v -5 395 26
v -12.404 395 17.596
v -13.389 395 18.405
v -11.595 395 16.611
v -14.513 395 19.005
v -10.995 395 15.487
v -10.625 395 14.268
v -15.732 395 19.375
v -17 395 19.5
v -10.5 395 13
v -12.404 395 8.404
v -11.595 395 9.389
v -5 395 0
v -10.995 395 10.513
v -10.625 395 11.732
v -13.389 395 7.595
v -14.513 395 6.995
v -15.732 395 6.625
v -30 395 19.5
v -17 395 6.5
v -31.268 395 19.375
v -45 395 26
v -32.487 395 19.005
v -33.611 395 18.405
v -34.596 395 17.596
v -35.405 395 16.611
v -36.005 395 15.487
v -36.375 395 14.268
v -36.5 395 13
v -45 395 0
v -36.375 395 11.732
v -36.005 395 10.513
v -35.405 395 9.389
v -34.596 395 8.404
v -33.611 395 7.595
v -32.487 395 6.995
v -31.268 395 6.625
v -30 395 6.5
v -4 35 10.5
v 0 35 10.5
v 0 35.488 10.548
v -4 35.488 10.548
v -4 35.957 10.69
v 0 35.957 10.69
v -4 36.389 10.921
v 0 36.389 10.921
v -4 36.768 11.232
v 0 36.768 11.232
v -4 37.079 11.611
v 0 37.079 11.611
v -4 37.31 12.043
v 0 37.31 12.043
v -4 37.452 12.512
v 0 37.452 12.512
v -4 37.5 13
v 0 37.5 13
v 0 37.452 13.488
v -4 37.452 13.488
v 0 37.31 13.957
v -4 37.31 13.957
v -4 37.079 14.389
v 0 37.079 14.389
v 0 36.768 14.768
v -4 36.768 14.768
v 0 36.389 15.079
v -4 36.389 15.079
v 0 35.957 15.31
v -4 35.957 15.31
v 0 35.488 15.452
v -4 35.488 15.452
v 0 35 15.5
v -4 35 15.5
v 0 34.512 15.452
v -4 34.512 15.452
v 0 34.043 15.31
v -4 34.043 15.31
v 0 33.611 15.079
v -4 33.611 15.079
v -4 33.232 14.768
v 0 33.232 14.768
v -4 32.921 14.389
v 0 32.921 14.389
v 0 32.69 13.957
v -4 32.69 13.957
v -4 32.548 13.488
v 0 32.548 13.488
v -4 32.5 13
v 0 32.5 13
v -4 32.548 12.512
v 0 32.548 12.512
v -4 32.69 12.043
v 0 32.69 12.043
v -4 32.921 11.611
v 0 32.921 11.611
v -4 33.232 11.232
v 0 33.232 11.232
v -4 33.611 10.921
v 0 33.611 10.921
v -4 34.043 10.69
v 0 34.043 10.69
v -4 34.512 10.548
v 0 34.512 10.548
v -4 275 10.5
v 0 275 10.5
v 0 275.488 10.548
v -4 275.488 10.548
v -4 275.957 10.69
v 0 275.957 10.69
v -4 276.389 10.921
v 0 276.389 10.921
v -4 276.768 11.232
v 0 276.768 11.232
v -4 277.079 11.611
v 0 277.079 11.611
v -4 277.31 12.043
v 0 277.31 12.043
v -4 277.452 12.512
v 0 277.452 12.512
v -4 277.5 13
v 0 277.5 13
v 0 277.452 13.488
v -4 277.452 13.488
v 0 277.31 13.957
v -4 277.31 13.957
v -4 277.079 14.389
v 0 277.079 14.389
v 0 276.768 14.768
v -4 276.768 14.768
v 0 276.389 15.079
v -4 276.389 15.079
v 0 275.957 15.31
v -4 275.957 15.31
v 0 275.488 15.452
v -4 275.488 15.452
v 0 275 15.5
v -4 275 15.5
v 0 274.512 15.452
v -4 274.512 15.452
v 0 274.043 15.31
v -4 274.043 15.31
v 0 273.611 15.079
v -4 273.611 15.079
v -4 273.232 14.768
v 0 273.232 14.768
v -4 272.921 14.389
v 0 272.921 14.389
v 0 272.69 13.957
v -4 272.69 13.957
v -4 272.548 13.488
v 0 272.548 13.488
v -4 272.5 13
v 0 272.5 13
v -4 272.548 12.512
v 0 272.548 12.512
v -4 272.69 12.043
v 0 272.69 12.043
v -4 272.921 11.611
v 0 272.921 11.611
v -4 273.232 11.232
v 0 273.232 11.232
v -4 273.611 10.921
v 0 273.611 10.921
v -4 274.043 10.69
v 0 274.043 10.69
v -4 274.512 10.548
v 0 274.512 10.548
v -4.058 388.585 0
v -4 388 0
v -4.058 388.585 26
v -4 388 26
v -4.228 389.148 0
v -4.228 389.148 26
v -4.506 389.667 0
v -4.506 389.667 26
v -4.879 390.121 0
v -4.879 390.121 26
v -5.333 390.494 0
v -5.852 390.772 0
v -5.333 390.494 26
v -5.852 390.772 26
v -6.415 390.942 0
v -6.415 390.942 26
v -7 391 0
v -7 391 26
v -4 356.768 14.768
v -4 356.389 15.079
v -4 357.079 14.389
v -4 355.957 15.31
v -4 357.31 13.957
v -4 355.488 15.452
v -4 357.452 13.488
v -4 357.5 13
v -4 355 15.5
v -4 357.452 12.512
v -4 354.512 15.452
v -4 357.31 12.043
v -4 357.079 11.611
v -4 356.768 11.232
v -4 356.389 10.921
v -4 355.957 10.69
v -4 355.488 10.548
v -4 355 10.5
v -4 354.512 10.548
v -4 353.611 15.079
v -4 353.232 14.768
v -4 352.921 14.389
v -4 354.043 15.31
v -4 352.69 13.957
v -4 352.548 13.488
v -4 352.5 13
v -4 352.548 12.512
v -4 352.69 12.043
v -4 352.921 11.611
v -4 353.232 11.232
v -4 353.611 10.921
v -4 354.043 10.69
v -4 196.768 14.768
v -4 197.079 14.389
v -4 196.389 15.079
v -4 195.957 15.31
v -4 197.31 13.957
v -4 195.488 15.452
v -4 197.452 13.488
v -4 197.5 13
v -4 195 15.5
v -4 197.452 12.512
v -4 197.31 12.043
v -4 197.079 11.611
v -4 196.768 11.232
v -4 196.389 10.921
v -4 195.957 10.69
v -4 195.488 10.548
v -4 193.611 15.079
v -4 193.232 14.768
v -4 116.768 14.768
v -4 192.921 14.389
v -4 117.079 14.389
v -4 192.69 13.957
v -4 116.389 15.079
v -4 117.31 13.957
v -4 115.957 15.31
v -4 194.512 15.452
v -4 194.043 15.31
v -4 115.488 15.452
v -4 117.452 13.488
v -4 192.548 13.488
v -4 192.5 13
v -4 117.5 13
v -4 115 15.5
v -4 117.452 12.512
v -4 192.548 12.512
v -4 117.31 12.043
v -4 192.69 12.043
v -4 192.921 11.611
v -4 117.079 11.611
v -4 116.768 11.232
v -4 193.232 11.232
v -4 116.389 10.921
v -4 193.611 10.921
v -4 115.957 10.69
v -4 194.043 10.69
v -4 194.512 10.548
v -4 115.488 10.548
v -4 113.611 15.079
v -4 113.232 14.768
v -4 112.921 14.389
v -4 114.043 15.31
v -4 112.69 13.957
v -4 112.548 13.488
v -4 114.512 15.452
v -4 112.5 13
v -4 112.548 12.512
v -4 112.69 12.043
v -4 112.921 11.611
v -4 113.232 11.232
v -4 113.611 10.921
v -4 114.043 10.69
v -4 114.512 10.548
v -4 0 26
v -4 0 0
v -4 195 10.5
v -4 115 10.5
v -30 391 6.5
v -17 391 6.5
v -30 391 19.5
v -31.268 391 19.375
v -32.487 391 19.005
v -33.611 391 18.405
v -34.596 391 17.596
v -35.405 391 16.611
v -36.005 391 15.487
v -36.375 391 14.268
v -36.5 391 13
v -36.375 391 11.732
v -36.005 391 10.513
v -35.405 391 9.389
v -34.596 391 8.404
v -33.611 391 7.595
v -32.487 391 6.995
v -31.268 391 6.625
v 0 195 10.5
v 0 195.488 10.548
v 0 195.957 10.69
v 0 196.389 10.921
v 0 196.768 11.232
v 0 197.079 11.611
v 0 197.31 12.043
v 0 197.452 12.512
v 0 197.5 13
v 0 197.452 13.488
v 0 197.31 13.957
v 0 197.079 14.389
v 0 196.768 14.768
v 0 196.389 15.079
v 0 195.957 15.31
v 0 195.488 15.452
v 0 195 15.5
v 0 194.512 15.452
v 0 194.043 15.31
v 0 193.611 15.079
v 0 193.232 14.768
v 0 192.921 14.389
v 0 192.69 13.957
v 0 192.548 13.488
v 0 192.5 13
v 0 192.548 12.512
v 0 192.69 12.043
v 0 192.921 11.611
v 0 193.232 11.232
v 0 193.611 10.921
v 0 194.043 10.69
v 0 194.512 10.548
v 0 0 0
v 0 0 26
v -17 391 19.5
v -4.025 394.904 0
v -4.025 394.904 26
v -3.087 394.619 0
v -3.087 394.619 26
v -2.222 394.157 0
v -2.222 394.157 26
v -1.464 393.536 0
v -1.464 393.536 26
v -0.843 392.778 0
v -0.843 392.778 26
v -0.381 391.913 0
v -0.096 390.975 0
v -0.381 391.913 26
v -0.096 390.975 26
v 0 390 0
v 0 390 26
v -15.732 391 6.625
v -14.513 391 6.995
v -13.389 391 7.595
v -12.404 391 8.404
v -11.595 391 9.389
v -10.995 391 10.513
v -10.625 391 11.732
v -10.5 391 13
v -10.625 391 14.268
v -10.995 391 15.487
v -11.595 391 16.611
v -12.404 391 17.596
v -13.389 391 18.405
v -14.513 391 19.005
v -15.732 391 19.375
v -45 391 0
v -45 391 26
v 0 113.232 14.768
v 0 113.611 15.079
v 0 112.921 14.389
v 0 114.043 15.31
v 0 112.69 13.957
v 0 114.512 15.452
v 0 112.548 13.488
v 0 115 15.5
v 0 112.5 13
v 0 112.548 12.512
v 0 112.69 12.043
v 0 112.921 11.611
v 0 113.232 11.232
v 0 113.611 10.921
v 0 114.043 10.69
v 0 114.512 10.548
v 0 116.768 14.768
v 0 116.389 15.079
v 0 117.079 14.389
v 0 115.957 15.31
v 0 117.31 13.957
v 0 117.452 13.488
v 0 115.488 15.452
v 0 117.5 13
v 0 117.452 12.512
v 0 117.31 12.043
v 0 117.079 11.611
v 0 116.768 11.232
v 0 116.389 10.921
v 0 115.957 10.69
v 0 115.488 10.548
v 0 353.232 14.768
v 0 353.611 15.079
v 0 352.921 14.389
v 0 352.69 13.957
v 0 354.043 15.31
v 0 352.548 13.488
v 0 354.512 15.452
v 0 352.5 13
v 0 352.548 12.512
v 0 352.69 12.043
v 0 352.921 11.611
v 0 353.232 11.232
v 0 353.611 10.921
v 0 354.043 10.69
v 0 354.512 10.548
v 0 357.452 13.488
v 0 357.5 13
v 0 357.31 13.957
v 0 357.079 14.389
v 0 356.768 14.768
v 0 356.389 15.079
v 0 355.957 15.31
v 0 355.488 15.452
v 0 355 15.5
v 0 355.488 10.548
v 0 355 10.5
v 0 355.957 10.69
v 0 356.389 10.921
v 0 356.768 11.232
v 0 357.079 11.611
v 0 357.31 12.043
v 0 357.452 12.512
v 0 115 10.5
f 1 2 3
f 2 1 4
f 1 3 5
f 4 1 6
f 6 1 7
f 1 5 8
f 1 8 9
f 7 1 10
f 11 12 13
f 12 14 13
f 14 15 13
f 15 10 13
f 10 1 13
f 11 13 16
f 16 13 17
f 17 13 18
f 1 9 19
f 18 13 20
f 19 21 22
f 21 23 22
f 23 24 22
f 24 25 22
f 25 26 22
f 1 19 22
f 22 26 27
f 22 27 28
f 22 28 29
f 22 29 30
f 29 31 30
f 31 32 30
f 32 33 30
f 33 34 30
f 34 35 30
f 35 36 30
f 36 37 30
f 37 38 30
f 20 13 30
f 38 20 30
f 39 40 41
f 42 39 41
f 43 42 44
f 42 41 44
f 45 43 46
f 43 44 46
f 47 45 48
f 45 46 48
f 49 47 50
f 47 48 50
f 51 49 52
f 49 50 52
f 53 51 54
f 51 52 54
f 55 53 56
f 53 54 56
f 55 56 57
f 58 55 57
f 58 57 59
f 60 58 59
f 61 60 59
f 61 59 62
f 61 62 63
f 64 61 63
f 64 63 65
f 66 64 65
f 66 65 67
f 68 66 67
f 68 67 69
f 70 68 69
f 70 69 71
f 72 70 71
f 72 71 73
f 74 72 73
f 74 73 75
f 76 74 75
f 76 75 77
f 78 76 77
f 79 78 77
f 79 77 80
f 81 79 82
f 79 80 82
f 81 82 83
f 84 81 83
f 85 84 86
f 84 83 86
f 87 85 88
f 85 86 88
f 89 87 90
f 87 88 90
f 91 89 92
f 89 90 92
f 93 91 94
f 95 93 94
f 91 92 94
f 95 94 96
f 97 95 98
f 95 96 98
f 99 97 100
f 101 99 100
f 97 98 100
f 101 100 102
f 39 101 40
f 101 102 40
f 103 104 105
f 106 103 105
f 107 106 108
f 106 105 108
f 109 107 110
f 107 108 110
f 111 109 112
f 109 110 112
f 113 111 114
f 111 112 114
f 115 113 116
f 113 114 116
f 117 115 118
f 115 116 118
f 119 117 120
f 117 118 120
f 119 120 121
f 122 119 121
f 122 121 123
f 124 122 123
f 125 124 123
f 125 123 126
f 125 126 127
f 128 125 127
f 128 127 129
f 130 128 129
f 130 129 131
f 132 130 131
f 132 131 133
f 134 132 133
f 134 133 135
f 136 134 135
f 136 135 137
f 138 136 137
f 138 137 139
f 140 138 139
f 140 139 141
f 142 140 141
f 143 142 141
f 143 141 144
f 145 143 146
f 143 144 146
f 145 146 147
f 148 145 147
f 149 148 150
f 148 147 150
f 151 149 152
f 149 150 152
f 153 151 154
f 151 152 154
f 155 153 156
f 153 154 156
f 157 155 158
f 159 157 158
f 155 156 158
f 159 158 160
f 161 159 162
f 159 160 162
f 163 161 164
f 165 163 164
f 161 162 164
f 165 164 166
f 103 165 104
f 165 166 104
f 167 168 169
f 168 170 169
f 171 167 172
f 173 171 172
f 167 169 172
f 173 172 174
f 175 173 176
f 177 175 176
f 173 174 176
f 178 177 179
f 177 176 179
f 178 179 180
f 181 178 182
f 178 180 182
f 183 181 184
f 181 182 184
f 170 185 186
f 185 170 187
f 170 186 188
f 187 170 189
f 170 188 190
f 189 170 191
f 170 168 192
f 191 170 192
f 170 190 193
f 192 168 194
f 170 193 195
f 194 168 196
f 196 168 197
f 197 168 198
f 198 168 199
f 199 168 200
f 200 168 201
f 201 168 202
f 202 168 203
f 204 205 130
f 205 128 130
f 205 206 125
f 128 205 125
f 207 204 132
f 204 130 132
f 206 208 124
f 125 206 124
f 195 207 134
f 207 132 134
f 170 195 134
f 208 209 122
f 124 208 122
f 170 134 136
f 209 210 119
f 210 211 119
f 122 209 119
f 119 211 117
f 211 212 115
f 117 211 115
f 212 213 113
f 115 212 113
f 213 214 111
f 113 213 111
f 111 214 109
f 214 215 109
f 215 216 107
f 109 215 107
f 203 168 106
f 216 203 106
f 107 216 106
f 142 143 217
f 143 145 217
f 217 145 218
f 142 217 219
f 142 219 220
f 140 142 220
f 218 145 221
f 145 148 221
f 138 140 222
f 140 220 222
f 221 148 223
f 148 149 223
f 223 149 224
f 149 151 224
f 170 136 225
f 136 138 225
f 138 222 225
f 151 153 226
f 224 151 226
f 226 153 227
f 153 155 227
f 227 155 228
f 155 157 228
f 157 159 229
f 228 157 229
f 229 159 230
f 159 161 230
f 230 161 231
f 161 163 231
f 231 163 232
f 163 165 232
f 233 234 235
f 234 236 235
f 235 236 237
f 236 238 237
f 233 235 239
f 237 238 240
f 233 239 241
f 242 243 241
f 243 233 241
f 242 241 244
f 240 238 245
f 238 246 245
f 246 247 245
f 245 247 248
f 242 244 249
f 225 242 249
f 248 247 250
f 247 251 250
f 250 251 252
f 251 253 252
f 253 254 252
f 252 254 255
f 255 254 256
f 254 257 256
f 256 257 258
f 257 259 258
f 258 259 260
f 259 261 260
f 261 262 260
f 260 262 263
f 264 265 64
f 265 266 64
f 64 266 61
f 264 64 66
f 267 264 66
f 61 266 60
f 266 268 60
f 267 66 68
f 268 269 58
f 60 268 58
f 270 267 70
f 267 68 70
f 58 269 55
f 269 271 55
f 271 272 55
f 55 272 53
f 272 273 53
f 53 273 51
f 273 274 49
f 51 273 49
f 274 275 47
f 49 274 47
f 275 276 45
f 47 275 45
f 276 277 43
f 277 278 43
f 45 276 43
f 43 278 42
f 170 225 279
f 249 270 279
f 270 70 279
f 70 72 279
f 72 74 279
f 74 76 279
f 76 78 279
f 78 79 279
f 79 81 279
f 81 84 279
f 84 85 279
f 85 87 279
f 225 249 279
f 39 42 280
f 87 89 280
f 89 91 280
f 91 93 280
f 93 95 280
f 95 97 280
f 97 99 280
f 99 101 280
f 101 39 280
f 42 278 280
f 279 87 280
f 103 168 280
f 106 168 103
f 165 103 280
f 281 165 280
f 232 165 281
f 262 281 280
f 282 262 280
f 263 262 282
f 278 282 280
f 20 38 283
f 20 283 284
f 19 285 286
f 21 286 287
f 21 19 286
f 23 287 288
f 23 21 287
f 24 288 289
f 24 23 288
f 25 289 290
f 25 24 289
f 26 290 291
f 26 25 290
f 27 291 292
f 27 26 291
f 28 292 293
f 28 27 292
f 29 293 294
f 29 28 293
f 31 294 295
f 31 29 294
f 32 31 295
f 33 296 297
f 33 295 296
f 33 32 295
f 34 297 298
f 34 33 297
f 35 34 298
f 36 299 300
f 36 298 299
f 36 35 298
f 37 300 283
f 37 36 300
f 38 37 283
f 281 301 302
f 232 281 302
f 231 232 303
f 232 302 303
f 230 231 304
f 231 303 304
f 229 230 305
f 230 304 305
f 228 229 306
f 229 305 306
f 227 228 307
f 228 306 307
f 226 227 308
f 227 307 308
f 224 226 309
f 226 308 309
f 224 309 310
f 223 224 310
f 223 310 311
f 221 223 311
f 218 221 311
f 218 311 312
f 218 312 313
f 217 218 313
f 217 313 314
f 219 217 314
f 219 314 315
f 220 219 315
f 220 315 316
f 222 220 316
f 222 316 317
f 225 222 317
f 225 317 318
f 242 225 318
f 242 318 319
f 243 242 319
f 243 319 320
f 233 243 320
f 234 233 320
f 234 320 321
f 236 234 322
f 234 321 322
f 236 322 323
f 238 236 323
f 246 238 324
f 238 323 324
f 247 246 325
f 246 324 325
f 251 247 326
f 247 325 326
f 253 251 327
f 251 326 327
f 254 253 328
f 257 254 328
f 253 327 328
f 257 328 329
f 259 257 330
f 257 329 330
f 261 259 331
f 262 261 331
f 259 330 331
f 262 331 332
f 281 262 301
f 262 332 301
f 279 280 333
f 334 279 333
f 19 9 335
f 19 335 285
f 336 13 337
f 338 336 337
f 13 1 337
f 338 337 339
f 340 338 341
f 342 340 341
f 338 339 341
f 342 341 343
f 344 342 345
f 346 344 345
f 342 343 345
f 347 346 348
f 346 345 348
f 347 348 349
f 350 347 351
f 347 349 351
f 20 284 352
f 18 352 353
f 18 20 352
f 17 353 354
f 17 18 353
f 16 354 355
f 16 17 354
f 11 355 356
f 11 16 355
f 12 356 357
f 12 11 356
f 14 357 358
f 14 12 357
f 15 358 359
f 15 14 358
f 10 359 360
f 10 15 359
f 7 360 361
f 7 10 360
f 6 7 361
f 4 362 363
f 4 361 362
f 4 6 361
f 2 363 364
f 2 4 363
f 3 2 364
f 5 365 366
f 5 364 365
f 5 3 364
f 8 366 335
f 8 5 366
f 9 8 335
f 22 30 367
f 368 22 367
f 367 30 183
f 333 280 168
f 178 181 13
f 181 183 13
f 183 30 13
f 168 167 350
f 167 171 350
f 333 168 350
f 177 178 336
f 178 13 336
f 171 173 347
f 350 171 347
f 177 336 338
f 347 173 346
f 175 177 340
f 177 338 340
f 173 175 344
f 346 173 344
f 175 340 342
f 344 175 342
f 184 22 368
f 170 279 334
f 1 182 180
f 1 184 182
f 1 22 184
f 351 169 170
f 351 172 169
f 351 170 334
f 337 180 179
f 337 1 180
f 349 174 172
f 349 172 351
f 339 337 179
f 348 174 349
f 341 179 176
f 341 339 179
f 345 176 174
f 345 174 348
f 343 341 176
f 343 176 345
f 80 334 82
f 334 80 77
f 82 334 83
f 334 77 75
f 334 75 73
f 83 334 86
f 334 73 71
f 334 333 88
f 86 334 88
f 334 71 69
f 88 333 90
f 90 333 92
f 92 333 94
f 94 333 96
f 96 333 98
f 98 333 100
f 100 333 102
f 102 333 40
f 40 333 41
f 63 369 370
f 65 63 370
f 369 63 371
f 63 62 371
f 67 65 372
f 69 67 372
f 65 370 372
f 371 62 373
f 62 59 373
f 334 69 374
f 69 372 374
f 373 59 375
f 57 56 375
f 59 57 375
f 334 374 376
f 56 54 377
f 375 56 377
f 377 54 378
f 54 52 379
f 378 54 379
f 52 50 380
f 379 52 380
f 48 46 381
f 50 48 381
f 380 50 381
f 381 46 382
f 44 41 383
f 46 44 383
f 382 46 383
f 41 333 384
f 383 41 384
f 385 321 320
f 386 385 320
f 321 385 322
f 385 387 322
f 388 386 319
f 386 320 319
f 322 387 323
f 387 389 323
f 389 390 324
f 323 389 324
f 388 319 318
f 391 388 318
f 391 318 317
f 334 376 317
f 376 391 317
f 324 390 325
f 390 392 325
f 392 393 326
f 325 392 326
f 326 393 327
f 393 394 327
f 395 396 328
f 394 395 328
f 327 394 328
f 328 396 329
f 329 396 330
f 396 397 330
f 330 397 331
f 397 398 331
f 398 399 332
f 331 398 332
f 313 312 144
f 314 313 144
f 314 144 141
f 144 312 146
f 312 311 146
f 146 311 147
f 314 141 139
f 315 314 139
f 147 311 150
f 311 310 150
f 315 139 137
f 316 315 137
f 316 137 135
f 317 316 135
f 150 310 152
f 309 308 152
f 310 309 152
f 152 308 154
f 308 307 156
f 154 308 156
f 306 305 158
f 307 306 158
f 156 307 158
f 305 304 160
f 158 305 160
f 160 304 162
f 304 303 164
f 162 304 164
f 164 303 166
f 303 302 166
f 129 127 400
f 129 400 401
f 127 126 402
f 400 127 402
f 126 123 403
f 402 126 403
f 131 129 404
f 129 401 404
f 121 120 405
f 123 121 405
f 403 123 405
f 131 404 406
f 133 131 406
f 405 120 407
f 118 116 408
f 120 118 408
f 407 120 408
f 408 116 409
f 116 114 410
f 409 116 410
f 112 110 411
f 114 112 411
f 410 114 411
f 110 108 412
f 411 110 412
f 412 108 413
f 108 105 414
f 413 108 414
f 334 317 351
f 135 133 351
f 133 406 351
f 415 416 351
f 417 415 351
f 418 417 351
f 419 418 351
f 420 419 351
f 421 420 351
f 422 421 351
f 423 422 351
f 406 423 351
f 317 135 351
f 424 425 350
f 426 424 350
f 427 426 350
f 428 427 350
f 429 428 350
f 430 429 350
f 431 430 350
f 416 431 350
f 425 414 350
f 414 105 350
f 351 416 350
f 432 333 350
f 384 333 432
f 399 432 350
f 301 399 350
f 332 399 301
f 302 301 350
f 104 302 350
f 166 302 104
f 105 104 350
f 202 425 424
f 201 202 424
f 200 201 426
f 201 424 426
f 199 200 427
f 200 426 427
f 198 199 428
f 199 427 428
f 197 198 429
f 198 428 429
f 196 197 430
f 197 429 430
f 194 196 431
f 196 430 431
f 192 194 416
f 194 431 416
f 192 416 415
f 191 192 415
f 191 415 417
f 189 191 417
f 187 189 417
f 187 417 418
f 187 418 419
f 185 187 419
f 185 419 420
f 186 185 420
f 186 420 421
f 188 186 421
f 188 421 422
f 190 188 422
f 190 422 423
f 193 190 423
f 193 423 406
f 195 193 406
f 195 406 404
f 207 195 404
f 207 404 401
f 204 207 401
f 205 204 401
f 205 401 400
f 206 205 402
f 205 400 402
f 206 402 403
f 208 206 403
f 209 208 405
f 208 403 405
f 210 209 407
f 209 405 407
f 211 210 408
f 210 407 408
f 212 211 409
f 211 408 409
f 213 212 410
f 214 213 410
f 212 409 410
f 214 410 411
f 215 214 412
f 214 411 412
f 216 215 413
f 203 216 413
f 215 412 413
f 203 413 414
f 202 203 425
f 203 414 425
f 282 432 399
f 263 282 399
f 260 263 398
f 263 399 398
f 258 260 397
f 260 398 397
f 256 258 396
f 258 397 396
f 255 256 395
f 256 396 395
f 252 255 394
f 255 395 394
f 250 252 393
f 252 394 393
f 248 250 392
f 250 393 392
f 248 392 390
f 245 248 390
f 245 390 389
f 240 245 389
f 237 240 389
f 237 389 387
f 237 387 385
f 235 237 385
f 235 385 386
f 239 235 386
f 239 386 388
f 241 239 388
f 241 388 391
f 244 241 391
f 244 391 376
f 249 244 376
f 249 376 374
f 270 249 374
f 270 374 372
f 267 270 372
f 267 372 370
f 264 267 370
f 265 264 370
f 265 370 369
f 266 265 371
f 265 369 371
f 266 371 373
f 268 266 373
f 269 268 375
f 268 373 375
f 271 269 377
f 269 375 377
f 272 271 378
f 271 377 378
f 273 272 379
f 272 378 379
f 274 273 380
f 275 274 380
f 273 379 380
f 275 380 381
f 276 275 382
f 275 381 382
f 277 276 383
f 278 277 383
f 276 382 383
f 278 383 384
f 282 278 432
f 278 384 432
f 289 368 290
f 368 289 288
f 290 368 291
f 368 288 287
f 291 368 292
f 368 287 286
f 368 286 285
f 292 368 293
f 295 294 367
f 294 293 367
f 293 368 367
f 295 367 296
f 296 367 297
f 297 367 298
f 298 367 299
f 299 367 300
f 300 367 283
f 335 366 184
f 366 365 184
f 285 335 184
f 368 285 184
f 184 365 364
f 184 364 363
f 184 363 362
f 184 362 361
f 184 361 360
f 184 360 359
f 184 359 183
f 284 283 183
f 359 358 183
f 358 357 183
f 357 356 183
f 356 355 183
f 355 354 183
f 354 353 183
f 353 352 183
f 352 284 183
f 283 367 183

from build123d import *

# Parameters (mm, degrees)
BOSS_EXTRUDE1_DEPTH = 26
SKETCH2_R           = 2.5
CUT_EXTRUDE1_DEPTH  = 46
CUT_EXTRUDE2_DEPTH  = 396
FILLET1_R           = 3
FILLET2_R           = 5


with BuildPart() as part:
    # Sketch1 → Boss-Extrude1 (new body)
    with BuildSketch(Plane.XY):
        Polygon((0, 0), (0, 395), (-45, 395), (-45, 391), (-4, 391), (-4, 0), align=None)
    extrude(amount=BOSS_EXTRUDE1_DEPTH)

    # Sketch2 → Cut-Extrude1 (cut, through all)
    with BuildSketch(Plane(origin=(0, 0, 0), x_dir=(0, 0, -1), z_dir=(1, 0, 0))):
        with Locations((-13, 195)):
            Circle(SKETCH2_R)
        with Locations((-13, 115)):
            Circle(SKETCH2_R)
        with Locations((-13, 35)):
            Circle(SKETCH2_R)
        with Locations((-13, 275)):
            Circle(SKETCH2_R)
        with Locations((-13, 355)):
            Circle(SKETCH2_R)
    extrude(amount=-CUT_EXTRUDE1_DEPTH, mode=Mode.SUBTRACT)

    # Sketch3 → Cut-Extrude2 (cut, through all)
    with BuildSketch(Plane(origin=(0, 395, 0), x_dir=(1, 0, 0), z_dir=(0, 1, 0))):
        with BuildLine():
            Line((-30, -6.5), (-17, -6.5))
            ThreePointArc((-17, -6.5), (-10.5, -13), (-17, -19.5))
            Line((-17, -19.5), (-30, -19.5))
            ThreePointArc((-30, -19.5), (-36.5, -13), (-30, -6.5))
        make_face()
    extrude(amount=-CUT_EXTRUDE2_DEPTH, mode=Mode.SUBTRACT)

    # Fillet1
    fillet1_edges = [part.edges().sort_by_distance(p)[0] for p in [
        (-4, 391, 13),
    ]]
    fillet(fillet1_edges, radius=FILLET1_R)

    # Fillet2
    fillet2_edges = [part.edges().sort_by_distance(p)[0] for p in [
        (0, 395, 13),
    ]]
    fillet(fillet2_edges, radius=FILLET2_R)


solid = part.part
